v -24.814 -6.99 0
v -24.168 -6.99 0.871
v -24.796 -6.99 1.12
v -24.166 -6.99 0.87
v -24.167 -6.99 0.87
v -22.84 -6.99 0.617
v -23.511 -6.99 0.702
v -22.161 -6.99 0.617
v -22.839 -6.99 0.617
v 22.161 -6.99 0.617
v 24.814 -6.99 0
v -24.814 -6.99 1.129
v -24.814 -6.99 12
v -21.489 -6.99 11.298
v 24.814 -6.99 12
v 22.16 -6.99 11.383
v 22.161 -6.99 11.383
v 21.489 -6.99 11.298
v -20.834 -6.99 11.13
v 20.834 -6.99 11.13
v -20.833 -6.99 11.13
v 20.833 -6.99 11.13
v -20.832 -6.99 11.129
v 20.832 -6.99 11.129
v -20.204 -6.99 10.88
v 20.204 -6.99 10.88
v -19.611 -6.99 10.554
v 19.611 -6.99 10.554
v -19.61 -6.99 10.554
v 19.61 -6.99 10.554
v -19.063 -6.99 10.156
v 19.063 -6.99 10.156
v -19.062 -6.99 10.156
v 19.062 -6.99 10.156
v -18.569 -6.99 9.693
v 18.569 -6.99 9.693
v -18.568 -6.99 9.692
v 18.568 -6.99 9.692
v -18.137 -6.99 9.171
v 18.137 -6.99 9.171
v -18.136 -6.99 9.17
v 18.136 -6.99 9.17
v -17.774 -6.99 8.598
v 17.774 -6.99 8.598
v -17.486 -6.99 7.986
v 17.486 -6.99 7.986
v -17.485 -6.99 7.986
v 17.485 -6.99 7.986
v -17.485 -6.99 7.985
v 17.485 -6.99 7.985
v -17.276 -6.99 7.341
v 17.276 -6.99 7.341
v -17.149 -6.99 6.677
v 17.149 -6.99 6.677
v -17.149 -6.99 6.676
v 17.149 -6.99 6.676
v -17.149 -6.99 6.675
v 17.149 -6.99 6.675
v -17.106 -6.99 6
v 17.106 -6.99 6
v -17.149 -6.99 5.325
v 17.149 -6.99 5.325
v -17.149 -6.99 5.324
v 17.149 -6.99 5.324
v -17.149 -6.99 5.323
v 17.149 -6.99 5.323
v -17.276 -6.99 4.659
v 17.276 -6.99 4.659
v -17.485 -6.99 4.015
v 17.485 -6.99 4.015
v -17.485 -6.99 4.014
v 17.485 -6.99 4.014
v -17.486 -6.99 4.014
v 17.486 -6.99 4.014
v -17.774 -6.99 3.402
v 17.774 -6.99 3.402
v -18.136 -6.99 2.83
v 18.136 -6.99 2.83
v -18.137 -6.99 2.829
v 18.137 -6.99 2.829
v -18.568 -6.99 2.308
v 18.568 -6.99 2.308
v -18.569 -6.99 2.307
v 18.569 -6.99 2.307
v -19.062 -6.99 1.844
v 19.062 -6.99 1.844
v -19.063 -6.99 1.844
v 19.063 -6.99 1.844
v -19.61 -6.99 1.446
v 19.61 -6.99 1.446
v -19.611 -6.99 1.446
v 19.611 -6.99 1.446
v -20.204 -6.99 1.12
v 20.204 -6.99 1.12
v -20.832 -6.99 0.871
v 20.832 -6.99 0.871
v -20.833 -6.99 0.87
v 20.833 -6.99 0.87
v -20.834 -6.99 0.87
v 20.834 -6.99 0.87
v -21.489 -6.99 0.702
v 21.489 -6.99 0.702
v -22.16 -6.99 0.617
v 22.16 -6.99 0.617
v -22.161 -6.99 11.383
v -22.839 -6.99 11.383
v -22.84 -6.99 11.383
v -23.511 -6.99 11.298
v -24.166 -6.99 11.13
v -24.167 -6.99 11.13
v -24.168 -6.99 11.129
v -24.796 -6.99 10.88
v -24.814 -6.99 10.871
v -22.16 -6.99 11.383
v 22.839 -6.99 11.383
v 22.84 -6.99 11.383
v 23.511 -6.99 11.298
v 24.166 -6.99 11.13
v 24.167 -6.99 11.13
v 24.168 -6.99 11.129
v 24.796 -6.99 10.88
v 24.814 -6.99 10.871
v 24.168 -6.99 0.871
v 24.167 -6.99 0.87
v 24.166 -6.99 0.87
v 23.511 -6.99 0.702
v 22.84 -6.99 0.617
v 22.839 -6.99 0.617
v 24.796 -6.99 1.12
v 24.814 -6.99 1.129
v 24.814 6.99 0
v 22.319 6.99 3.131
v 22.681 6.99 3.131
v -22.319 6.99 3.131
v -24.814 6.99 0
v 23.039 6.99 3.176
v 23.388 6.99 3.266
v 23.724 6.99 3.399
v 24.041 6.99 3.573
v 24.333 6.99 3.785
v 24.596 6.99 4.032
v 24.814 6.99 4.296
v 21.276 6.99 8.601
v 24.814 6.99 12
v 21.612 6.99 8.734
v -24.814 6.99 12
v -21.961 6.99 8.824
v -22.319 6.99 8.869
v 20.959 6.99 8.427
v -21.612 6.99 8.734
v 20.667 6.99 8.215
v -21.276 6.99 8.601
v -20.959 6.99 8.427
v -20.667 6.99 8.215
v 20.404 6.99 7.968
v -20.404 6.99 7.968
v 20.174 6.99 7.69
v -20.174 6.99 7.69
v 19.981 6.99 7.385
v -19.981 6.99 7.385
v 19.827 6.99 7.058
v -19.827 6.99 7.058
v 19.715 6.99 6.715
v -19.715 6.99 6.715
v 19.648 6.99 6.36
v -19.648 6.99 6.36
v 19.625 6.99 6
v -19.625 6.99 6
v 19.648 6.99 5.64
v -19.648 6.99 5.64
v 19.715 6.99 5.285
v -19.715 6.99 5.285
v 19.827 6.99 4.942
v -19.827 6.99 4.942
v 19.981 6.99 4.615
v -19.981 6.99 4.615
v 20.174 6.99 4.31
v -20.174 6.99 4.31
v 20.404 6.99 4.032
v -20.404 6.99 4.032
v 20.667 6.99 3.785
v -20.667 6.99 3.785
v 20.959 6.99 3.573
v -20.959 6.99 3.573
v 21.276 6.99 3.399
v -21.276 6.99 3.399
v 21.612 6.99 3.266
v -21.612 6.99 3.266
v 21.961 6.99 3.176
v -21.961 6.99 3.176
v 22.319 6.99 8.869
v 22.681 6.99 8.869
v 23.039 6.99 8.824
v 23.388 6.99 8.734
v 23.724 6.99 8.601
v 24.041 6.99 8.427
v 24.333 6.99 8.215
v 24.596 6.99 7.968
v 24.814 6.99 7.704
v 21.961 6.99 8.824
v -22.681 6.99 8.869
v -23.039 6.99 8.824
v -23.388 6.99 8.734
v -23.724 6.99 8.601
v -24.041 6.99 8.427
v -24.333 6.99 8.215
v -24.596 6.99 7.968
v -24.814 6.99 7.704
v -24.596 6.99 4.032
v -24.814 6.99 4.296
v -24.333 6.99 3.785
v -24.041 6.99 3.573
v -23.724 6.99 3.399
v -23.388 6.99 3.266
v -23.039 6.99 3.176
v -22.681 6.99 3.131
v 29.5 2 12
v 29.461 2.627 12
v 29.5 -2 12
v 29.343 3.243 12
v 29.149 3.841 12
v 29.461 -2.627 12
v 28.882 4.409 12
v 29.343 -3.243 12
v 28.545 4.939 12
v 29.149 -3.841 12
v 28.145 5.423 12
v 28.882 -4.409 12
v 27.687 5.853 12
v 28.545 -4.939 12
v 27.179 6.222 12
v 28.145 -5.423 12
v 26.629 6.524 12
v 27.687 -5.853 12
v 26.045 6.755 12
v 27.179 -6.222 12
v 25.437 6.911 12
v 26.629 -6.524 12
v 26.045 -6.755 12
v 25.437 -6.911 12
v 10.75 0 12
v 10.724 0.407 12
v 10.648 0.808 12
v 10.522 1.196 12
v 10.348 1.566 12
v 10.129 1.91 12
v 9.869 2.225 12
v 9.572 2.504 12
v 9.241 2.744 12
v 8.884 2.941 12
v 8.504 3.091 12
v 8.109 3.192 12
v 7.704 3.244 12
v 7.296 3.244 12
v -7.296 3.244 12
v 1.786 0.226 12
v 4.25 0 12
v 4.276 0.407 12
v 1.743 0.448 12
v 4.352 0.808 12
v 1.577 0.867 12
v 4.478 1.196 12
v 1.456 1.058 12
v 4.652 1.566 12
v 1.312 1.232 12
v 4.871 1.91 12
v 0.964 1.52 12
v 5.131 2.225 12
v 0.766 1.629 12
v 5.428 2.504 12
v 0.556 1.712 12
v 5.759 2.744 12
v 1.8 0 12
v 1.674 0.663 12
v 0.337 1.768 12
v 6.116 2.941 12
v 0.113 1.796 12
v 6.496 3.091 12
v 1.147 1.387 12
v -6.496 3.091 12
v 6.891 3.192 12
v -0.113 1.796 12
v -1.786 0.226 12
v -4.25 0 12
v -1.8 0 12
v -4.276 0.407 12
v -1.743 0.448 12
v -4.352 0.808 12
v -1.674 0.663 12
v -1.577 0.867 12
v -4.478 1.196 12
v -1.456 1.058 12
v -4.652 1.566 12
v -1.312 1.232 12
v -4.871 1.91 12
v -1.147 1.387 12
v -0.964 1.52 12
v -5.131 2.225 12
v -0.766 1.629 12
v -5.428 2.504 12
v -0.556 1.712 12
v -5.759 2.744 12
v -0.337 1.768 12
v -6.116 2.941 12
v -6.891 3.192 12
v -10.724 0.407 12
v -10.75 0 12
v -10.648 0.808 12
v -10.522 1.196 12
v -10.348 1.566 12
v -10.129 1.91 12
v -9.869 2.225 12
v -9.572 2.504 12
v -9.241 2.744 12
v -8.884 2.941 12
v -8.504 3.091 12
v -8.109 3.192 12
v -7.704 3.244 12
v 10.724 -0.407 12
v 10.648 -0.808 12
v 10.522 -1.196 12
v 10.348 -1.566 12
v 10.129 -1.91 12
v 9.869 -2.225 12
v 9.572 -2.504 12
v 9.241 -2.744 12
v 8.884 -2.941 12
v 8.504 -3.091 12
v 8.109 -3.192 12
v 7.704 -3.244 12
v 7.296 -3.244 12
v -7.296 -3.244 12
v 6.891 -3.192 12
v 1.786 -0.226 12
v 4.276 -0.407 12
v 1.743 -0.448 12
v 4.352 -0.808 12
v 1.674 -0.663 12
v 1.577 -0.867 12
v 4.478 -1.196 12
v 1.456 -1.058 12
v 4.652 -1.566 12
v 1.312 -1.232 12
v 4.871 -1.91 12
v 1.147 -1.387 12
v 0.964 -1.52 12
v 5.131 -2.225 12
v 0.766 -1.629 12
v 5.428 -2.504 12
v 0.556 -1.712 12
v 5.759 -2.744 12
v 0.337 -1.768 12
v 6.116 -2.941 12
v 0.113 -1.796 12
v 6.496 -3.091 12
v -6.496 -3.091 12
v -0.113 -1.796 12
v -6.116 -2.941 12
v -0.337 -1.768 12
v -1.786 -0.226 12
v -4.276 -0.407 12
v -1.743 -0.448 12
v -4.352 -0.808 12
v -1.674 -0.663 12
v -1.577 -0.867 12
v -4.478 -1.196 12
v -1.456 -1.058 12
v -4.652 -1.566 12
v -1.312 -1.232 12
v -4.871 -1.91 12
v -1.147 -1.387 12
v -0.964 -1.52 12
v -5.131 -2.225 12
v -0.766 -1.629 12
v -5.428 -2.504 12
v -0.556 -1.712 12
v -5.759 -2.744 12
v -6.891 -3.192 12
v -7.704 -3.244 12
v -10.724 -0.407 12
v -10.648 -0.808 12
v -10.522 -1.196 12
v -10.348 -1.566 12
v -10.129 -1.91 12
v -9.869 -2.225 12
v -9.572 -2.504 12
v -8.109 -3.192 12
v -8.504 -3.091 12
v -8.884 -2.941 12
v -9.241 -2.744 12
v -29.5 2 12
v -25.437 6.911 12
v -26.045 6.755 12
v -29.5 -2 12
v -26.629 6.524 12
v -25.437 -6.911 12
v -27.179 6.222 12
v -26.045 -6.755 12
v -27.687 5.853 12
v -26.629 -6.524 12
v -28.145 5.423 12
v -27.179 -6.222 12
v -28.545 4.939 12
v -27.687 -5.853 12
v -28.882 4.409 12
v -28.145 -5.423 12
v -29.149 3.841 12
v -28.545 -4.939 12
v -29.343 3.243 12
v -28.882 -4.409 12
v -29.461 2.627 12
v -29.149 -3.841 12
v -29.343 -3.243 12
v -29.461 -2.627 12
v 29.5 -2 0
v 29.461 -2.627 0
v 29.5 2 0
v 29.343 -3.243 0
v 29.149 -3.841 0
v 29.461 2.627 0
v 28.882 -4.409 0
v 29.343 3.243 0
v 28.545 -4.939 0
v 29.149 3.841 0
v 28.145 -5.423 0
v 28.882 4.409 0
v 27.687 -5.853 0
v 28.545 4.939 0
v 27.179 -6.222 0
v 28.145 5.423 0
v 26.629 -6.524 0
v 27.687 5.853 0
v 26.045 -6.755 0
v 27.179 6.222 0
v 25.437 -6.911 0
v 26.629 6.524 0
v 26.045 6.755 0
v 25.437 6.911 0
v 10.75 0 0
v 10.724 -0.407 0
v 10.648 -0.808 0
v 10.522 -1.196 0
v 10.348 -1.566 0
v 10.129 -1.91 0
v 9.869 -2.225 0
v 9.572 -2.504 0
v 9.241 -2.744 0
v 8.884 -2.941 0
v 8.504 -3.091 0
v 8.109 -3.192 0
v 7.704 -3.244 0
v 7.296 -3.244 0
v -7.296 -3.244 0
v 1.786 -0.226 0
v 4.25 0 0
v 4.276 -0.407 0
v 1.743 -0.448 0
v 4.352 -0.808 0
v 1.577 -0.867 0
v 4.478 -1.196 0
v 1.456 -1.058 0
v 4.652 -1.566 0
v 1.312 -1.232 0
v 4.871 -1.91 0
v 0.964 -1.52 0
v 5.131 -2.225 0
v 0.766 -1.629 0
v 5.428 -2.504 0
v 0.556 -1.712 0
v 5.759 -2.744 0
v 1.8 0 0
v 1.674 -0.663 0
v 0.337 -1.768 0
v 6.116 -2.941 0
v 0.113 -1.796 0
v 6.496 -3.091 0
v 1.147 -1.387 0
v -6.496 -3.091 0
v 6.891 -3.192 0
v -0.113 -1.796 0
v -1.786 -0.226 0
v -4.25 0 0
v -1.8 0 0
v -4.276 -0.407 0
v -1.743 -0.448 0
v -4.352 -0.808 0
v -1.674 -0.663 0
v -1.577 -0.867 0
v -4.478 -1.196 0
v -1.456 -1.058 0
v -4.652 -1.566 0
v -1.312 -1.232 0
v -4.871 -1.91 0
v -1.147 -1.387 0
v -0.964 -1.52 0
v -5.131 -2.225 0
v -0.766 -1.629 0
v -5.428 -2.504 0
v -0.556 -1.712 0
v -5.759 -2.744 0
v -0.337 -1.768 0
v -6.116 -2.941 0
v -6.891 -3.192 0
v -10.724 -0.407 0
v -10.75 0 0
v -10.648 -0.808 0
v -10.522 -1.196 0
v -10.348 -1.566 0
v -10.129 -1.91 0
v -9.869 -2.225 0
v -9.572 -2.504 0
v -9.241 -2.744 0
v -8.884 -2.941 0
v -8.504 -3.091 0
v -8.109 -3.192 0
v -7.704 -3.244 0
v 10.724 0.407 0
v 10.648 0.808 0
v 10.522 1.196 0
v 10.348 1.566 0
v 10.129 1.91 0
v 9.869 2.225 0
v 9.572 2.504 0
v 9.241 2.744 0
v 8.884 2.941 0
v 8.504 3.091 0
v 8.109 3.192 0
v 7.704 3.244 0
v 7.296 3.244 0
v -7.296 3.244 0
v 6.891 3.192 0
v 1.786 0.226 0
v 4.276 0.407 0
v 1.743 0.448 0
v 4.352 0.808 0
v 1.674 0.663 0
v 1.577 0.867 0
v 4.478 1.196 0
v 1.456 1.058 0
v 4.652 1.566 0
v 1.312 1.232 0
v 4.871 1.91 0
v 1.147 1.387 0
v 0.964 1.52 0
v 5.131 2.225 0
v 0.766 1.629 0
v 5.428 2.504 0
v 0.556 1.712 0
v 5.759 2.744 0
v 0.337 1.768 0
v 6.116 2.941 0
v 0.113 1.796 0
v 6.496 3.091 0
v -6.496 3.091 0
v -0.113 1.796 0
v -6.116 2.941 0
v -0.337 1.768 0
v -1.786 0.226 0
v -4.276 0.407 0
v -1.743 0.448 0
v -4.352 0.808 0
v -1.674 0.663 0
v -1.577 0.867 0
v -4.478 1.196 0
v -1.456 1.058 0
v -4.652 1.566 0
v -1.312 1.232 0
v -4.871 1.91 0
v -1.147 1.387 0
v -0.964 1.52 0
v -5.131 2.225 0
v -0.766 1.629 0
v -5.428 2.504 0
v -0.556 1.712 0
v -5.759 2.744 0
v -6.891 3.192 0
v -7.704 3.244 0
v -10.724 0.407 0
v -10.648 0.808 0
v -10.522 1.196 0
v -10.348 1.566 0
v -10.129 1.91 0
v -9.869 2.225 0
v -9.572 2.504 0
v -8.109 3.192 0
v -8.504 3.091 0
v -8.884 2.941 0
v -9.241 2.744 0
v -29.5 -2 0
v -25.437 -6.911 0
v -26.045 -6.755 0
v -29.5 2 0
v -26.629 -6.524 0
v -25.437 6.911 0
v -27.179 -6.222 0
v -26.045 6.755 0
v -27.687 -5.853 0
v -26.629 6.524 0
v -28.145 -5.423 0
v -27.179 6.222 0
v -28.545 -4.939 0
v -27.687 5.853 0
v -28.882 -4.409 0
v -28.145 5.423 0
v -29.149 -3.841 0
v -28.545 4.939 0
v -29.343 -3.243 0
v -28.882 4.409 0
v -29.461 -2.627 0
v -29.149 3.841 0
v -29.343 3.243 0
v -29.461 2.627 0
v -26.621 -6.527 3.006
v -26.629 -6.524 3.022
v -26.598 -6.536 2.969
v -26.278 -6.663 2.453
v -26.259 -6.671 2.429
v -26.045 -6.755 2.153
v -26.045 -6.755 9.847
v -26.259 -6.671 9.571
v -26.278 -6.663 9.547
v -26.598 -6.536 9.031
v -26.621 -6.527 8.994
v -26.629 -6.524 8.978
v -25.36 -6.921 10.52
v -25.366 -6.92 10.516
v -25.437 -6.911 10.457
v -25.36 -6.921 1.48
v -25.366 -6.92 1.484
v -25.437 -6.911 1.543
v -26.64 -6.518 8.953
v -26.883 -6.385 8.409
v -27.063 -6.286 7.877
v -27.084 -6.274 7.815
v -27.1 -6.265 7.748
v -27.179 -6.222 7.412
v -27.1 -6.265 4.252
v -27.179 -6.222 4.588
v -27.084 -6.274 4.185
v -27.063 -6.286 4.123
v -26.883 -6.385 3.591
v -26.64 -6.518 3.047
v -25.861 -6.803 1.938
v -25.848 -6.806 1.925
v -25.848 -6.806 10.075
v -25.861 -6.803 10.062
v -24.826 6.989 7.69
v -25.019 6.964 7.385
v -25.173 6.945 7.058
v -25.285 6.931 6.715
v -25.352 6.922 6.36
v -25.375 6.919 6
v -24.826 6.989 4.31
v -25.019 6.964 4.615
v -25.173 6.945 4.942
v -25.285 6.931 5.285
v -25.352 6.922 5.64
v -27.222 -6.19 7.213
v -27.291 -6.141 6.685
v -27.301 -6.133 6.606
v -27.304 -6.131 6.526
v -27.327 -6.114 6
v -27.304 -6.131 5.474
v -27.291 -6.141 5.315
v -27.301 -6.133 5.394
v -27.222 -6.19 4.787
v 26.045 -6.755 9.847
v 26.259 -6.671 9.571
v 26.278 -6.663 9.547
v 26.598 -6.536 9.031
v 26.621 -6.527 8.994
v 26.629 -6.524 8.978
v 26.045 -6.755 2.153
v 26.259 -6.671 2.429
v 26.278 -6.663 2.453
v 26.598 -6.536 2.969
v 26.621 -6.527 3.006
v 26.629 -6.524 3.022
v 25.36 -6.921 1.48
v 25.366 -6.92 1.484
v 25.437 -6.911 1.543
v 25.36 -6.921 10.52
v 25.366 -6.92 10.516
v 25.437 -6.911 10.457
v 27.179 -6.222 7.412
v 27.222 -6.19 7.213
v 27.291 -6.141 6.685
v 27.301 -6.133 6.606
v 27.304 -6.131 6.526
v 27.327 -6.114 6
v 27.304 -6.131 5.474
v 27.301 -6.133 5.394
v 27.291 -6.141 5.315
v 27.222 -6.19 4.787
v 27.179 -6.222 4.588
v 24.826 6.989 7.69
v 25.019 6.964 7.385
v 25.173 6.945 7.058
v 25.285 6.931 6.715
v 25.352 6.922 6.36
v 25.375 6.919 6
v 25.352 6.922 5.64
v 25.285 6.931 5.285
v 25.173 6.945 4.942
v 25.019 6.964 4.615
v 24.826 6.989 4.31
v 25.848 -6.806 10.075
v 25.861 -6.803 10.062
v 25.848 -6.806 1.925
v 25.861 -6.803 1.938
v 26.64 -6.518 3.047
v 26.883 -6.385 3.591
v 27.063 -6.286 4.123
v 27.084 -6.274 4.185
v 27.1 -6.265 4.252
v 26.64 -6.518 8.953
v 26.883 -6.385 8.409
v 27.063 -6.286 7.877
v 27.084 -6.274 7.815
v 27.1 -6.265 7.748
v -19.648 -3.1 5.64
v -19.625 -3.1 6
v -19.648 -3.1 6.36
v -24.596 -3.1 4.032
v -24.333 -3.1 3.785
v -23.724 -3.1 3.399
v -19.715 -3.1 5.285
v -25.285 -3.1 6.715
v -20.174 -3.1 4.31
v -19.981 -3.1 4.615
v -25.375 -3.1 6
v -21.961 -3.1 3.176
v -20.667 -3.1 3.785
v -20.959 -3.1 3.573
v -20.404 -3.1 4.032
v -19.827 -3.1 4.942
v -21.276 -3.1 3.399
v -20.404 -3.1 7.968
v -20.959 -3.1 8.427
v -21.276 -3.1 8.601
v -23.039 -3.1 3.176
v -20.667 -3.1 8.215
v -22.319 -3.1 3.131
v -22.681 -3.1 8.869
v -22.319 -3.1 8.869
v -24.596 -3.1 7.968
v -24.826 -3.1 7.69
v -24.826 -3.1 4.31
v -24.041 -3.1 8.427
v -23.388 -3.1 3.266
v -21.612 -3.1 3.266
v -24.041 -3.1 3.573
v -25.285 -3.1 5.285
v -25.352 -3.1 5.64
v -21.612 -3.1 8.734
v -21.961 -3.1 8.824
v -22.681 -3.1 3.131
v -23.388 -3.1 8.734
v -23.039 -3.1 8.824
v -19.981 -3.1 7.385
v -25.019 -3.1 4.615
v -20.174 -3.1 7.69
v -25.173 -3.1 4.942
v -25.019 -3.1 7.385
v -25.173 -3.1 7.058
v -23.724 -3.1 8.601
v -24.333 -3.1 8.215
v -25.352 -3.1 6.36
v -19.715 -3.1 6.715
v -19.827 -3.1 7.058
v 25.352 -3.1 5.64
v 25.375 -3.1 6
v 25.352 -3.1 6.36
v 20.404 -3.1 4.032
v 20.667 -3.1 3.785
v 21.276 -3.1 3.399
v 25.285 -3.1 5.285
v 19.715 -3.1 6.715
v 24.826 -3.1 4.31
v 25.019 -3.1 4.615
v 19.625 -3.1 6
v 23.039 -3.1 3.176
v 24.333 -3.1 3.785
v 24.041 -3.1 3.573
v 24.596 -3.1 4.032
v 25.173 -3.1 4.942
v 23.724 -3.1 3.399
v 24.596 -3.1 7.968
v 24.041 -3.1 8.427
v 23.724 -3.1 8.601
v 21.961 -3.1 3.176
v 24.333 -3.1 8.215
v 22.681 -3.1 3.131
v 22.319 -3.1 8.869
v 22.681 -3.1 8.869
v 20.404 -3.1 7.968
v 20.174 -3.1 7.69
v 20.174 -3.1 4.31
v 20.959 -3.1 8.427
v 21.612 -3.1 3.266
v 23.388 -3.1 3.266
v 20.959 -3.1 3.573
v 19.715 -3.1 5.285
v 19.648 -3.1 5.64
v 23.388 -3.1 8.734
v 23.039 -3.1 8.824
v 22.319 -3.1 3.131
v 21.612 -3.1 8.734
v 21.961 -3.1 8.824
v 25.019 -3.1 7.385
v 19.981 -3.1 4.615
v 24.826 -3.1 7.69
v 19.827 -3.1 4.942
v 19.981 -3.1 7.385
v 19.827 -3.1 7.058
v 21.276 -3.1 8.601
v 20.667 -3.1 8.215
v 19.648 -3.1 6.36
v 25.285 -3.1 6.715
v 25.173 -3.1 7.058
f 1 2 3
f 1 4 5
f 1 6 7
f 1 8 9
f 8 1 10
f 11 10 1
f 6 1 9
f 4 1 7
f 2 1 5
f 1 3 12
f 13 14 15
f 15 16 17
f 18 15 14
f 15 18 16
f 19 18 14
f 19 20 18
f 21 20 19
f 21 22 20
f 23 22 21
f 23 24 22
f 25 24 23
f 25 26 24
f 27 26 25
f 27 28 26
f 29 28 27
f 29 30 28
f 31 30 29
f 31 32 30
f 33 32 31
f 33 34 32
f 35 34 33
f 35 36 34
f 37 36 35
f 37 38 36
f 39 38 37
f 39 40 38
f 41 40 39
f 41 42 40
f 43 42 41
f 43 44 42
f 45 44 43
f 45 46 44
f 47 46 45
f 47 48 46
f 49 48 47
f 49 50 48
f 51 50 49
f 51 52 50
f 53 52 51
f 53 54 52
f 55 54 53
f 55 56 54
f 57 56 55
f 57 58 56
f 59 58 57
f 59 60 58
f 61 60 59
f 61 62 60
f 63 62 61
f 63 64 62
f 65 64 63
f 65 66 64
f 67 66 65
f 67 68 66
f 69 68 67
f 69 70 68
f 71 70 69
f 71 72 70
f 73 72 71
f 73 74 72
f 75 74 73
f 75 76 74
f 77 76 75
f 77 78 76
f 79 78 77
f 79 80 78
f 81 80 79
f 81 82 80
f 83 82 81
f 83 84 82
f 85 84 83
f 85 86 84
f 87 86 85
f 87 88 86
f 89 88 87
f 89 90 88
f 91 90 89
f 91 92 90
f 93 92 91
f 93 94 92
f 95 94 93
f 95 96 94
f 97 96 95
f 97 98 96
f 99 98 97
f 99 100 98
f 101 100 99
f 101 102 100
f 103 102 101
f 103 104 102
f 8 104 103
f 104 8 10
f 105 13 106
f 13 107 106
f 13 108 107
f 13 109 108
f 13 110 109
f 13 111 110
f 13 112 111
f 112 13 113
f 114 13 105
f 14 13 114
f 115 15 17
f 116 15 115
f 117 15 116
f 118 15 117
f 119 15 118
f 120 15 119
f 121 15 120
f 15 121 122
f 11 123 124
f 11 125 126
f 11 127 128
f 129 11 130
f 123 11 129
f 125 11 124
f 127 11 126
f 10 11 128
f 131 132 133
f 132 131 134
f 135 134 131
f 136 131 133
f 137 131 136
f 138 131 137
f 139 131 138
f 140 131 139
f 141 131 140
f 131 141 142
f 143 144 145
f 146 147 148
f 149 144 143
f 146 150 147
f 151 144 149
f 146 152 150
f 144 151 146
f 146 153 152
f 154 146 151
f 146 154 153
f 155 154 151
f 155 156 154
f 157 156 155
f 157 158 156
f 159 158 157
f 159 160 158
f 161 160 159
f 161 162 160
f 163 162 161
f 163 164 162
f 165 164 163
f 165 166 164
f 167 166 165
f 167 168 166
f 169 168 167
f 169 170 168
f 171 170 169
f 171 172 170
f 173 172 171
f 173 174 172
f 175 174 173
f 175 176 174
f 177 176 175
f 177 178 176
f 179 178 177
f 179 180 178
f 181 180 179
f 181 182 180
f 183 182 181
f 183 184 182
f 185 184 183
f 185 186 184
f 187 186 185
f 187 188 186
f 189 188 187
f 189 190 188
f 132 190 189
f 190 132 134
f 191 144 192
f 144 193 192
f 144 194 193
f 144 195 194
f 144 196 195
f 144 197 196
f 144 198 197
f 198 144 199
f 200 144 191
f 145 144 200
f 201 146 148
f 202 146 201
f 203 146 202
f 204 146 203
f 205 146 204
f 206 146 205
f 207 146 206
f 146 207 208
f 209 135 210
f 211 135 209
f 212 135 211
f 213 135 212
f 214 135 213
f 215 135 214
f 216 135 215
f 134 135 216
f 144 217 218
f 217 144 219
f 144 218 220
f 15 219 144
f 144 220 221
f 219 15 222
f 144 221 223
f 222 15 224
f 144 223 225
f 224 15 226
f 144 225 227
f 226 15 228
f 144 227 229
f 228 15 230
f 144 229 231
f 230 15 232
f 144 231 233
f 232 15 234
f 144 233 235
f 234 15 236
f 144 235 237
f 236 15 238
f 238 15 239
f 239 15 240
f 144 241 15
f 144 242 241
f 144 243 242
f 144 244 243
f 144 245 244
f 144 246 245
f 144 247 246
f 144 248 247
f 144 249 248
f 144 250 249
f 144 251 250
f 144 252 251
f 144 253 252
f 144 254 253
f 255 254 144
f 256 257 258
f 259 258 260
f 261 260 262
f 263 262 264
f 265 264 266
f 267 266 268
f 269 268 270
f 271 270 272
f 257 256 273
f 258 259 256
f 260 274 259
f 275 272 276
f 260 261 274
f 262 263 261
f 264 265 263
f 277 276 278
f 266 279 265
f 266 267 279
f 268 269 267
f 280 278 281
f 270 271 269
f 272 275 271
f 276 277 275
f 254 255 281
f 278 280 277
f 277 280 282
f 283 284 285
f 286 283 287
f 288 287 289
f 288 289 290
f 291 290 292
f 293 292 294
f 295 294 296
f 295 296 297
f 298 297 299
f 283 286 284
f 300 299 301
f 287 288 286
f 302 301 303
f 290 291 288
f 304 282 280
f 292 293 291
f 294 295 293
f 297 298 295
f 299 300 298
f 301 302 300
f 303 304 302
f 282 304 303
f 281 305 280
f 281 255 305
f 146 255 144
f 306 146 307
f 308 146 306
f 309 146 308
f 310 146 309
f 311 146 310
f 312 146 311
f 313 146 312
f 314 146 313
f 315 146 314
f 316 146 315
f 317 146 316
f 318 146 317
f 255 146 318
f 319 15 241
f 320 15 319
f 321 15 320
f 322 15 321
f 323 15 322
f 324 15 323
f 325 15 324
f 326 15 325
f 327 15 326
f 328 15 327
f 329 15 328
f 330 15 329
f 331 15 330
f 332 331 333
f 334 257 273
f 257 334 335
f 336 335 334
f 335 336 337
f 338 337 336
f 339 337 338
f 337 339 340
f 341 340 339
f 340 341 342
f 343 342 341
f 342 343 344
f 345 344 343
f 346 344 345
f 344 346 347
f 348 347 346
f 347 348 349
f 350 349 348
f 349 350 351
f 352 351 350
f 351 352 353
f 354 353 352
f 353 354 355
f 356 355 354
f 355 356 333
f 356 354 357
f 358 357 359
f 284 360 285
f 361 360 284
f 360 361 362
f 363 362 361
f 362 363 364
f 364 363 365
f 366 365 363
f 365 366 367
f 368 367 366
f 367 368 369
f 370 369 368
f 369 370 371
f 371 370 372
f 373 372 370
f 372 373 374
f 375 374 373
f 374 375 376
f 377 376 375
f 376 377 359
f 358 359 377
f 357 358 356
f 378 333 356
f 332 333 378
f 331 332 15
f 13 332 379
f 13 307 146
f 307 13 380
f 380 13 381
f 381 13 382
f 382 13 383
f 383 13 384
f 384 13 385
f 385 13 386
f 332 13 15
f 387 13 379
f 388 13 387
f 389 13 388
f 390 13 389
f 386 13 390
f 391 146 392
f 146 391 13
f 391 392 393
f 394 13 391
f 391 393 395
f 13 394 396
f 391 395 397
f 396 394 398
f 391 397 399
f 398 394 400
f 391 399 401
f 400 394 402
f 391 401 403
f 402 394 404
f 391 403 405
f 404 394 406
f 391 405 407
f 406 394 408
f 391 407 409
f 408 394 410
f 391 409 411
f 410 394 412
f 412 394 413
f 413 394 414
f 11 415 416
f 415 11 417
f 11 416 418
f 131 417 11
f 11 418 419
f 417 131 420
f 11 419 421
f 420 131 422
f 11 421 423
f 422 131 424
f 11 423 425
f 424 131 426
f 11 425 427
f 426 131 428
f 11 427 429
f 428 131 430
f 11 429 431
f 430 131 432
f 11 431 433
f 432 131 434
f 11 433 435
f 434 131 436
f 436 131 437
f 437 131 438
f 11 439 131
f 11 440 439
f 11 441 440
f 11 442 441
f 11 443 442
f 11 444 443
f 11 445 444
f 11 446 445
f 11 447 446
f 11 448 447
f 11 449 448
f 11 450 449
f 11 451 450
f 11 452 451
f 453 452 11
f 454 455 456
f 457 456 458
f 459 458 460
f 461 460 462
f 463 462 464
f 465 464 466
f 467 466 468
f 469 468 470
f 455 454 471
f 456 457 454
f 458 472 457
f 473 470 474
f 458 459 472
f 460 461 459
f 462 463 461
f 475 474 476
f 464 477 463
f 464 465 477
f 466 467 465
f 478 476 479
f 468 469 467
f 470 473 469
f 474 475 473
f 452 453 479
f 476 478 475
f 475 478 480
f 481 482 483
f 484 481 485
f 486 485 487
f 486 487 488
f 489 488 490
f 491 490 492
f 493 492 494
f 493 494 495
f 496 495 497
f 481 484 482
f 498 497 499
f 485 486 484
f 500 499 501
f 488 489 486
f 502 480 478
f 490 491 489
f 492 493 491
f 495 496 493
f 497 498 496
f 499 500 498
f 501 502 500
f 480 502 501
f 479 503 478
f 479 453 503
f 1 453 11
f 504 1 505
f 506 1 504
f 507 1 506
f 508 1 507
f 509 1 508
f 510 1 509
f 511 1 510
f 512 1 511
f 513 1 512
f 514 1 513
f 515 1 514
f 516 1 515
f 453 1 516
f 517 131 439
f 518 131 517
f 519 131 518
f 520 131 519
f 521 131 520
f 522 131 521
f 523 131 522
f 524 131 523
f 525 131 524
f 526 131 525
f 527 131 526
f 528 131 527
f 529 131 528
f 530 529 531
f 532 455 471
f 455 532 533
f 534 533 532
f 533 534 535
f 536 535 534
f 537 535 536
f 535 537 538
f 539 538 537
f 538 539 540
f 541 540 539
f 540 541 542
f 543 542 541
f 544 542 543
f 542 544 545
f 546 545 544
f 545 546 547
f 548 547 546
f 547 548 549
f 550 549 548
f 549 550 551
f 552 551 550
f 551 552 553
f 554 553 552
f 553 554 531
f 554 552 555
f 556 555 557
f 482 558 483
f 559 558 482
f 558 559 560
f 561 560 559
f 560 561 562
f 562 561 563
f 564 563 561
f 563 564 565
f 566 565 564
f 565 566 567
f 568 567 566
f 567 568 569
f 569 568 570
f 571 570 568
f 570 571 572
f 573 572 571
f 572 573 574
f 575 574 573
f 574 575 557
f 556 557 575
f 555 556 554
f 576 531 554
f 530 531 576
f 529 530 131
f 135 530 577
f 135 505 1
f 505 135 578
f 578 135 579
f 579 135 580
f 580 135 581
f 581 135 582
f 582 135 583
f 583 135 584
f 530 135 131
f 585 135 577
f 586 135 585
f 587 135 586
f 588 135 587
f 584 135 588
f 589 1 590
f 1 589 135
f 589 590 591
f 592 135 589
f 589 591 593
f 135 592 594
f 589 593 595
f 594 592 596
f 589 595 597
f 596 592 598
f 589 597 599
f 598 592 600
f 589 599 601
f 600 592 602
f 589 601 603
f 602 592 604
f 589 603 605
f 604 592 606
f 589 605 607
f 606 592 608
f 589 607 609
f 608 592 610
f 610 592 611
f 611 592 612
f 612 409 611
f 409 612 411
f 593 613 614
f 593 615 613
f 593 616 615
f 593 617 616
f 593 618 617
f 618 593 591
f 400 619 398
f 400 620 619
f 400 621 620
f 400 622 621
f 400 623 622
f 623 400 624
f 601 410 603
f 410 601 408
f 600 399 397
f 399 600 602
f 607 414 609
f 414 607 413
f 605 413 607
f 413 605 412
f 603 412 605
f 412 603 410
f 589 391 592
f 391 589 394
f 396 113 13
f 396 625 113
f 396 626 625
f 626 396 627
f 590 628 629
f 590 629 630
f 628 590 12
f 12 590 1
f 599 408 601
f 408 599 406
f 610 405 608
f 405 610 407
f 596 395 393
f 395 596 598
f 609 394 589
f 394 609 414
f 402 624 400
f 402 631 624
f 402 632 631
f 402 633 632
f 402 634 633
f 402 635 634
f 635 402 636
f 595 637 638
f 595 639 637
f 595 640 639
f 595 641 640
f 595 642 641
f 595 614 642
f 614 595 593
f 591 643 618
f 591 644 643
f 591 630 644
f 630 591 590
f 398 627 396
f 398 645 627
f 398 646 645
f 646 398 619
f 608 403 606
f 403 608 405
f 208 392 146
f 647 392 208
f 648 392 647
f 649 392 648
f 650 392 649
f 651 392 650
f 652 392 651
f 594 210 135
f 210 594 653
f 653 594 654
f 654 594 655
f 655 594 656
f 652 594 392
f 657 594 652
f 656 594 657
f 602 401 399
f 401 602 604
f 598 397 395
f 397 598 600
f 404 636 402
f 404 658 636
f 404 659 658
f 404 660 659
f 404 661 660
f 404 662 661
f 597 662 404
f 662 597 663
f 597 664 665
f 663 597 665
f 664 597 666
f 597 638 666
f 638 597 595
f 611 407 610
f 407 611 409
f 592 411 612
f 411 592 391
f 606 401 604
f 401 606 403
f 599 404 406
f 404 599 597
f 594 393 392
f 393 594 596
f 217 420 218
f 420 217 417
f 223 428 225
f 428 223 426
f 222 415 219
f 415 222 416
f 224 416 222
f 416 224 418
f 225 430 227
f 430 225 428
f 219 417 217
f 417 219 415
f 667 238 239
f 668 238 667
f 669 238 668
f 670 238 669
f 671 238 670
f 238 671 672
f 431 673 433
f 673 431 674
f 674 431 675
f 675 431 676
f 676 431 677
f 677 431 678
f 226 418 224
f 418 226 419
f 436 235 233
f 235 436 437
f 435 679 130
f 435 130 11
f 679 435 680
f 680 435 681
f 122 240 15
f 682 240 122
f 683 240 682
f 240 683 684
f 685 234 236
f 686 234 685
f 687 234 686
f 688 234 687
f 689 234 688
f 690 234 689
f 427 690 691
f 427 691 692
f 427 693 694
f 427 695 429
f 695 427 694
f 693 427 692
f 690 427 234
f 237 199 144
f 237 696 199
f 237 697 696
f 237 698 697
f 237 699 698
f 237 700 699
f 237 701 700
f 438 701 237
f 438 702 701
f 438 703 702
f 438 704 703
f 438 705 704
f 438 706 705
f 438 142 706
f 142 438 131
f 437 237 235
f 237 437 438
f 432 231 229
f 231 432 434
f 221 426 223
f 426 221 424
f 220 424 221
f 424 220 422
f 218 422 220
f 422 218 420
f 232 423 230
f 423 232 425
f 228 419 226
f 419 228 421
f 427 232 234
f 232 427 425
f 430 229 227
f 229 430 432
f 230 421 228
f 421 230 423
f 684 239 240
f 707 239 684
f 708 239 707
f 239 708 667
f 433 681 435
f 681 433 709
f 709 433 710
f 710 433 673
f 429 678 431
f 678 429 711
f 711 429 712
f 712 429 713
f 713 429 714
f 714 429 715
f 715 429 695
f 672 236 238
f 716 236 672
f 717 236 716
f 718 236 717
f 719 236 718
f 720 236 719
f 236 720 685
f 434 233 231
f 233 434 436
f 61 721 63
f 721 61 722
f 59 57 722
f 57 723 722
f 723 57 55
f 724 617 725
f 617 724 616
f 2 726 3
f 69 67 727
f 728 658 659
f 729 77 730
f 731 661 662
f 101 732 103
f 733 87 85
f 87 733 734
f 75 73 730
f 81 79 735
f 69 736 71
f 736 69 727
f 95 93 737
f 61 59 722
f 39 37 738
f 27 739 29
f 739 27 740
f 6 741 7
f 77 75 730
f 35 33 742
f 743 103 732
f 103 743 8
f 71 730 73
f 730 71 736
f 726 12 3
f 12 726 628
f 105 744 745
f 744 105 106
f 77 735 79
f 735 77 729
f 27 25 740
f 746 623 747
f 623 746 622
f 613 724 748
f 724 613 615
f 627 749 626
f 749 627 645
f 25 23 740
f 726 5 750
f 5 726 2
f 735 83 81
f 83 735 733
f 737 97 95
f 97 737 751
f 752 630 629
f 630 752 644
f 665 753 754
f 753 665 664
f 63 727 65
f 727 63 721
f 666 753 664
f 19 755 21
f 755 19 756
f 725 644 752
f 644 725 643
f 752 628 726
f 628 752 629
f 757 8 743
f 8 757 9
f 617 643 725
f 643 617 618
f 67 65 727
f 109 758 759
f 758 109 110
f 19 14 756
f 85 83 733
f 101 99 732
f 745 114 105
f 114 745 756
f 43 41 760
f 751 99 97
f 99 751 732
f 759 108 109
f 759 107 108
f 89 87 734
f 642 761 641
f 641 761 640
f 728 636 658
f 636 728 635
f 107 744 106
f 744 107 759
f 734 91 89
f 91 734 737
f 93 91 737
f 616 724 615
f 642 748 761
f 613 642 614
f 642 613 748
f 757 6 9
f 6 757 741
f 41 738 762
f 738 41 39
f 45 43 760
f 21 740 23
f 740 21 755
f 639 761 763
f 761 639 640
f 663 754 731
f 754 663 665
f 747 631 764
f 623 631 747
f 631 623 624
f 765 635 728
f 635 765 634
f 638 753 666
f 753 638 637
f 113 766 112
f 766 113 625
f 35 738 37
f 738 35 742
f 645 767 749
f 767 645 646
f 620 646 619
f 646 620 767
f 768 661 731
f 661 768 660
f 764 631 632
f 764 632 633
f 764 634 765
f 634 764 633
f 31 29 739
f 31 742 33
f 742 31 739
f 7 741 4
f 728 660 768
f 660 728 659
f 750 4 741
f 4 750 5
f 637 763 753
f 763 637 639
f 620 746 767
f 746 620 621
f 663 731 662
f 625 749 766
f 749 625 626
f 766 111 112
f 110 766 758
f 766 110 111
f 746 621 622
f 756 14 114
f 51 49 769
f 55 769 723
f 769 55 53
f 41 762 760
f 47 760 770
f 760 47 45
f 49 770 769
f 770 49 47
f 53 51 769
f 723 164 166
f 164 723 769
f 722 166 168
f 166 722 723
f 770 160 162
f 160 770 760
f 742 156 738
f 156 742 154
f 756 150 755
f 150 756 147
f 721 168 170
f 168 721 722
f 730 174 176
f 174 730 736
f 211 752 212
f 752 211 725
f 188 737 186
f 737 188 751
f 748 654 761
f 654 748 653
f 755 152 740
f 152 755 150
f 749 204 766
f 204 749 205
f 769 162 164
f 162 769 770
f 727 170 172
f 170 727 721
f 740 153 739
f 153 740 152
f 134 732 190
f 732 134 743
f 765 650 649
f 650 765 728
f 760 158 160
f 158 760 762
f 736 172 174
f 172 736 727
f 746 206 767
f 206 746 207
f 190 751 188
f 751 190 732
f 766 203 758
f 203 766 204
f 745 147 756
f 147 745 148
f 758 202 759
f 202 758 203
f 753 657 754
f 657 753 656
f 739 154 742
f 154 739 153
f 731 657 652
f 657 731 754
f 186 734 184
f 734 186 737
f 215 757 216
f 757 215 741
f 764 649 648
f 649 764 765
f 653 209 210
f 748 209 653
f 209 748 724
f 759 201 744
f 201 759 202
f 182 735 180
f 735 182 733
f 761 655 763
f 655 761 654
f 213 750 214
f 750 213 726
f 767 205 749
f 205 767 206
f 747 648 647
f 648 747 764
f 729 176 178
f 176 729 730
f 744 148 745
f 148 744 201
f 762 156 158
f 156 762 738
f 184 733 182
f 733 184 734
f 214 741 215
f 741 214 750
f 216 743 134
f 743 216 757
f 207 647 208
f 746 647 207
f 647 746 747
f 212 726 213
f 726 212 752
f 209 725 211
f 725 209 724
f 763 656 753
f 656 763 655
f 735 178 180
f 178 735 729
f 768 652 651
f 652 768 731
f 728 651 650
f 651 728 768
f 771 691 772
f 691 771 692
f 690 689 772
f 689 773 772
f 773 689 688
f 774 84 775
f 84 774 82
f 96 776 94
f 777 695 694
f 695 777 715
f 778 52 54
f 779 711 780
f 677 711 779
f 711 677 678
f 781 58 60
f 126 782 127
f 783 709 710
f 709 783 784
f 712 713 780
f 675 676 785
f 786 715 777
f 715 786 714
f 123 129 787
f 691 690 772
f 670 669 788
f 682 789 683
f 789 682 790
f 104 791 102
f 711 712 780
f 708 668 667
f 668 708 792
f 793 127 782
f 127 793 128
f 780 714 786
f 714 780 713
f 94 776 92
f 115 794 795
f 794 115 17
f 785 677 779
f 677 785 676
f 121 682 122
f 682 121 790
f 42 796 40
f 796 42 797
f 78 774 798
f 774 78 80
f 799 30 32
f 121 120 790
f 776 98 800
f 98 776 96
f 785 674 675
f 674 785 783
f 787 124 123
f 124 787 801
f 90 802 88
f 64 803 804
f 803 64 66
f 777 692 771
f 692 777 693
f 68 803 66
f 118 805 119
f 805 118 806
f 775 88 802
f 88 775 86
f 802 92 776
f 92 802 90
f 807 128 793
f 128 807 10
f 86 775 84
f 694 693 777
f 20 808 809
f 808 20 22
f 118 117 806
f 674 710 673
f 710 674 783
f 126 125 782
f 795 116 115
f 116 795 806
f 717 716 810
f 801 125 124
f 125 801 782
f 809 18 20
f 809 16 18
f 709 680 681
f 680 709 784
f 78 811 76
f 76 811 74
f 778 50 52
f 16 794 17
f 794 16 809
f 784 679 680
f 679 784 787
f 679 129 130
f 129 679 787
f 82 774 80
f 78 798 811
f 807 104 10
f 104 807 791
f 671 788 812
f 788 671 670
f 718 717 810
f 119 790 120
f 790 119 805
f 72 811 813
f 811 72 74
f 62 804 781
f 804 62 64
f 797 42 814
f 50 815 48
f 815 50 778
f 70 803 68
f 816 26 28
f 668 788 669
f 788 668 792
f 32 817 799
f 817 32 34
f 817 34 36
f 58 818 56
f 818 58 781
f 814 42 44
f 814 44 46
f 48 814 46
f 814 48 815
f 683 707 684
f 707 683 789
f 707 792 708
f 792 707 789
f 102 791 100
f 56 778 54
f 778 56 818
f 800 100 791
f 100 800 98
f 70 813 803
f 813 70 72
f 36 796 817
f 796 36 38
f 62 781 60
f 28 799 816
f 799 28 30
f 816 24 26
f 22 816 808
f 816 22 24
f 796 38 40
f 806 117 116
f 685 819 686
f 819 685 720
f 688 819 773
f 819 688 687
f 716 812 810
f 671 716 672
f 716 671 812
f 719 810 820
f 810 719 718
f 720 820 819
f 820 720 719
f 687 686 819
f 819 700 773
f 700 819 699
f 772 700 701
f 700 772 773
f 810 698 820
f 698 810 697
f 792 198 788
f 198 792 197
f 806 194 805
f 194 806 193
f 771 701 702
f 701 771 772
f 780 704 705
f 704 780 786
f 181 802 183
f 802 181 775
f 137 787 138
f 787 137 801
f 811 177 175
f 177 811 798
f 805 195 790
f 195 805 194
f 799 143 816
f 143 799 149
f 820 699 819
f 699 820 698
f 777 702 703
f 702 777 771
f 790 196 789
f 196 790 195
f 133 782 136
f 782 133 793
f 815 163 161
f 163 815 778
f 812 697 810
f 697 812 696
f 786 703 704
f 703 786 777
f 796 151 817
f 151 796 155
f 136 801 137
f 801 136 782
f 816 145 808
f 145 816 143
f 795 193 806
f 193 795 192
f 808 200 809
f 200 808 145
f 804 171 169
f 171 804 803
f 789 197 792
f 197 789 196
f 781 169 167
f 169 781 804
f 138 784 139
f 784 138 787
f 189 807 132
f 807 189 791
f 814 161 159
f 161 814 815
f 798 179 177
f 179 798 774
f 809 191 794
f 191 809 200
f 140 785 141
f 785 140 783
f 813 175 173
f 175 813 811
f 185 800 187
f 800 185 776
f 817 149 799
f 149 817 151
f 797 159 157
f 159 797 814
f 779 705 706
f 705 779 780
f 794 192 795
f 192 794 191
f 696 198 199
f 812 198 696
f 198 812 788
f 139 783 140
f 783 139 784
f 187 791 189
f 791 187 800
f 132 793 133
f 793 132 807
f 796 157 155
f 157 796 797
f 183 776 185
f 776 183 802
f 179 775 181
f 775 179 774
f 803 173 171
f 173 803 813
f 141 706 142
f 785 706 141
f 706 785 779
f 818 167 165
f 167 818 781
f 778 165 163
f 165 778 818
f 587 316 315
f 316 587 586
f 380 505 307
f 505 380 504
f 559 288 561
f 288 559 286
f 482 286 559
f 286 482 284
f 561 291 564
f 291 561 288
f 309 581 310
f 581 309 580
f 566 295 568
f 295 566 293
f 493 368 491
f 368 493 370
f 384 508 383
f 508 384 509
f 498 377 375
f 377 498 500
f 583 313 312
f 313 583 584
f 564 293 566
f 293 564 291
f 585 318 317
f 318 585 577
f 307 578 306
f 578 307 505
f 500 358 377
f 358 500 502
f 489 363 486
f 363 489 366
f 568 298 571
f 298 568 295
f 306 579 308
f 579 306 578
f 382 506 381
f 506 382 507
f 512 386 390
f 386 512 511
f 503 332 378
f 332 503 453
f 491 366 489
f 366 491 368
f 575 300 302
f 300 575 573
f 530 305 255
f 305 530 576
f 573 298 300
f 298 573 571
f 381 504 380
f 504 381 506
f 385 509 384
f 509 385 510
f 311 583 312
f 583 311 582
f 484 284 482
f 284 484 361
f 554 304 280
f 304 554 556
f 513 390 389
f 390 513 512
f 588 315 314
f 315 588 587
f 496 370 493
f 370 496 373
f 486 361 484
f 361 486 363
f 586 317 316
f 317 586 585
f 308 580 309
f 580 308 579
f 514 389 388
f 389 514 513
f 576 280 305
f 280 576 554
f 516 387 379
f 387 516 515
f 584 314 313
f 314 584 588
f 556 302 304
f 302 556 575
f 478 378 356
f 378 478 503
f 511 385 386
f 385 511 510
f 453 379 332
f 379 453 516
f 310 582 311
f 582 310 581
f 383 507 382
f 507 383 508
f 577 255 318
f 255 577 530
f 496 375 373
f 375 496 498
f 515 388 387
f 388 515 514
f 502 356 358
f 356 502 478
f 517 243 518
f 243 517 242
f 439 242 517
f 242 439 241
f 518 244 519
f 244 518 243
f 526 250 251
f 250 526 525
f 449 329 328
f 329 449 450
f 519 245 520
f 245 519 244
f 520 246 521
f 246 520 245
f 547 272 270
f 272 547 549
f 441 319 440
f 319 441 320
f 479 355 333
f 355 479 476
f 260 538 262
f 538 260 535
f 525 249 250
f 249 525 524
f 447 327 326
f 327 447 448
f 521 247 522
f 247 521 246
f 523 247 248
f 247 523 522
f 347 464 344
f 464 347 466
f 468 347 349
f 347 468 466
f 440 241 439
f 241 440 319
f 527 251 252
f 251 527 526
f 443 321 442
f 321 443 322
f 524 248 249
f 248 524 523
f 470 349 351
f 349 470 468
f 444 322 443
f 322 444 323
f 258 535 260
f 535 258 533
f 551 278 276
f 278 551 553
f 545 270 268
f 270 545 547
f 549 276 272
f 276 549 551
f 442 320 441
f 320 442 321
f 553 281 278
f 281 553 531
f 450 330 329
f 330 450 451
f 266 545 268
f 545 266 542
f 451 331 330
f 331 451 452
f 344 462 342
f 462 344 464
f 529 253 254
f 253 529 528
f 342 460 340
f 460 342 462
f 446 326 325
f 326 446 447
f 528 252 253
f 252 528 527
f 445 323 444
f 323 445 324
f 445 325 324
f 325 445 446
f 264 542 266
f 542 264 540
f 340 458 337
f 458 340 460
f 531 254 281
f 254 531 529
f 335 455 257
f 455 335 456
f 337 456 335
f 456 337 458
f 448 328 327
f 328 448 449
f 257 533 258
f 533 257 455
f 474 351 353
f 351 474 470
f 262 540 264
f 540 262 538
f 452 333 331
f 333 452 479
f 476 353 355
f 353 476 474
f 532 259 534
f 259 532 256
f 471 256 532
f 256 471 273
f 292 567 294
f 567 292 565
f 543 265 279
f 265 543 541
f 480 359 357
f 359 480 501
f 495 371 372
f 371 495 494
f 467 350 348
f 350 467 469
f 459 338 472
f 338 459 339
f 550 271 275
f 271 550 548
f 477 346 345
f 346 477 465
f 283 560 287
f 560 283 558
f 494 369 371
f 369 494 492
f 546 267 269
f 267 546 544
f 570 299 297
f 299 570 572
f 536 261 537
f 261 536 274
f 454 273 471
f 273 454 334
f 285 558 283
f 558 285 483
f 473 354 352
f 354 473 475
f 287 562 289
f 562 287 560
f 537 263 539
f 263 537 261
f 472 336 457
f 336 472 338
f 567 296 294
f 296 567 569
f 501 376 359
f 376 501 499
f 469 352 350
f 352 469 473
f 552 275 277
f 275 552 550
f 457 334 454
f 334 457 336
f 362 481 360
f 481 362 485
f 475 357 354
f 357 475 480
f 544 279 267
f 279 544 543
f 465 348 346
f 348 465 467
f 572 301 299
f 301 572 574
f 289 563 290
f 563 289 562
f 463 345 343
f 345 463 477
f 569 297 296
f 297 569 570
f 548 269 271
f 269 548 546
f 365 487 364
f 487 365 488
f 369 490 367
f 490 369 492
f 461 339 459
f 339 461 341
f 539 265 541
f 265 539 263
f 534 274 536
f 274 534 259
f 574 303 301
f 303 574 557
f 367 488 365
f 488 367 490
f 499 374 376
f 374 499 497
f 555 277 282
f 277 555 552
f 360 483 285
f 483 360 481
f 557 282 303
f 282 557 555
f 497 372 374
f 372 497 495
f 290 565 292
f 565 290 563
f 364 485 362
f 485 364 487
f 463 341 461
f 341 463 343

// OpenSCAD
$fn = 50;


difference() {
	union() {
		hull() {
			translate(v = [-9.5000000000, 2.0000000000, 0]) {
				cylinder(h = 12, r = 5);
			}
			translate(v = [9.5000000000, 2.0000000000, 0]) {
				cylinder(h = 12, r = 5);
			}
			translate(v = [-9.5000000000, -2.0000000000, 0]) {
				cylinder(h = 12, r = 5);
			}
			translate(v = [9.5000000000, -2.0000000000, 0]) {
				cylinder(h = 12, r = 5);
			}
		}
		translate(v = [-15.0000000000, 0.0000000000, 0]) {
			hull() {
				translate(v = [-9.5000000000, 2.0000000000, 0]) {
					cylinder(h = 12, r = 5);
				}
				translate(v = [9.5000000000, 2.0000000000, 0]) {
					cylinder(h = 12, r = 5);
				}
				translate(v = [-9.5000000000, -2.0000000000, 0]) {
					cylinder(h = 12, r = 5);
				}
				translate(v = [9.5000000000, -2.0000000000, 0]) {
					cylinder(h = 12, r = 5);
				}
			}
		}
		translate(v = [-15.0000000000, 0.0000000000, 0]) {
			hull() {
				translate(v = [-9.5000000000, 2.0000000000, 0]) {
					cylinder(h = 12, r = 5);
				}
				translate(v = [9.5000000000, 2.0000000000, 0]) {
					cylinder(h = 12, r = 5);
				}
				translate(v = [-9.5000000000, -2.0000000000, 0]) {
					cylinder(h = 12, r = 5);
				}
				translate(v = [9.5000000000, -2.0000000000, 0]) {
					cylinder(h = 12, r = 5);
				}
			}
		}
		translate(v = [15.0000000000, 0.0000000000, 0]) {
			hull() {
				translate(v = [-9.5000000000, 2.0000000000, 0]) {
					cylinder(h = 12, r = 5);
				}
				translate(v = [9.5000000000, 2.0000000000, 0]) {
					cylinder(h = 12, r = 5);
				}
				translate(v = [-9.5000000000, -2.0000000000, 0]) {
					cylinder(h = 12, r = 5);
				}
				translate(v = [9.5000000000, -2.0000000000, 0]) {
					cylinder(h = 12, r = 5);
				}
			}
		}
		translate(v = [15.0000000000, 0.0000000000, 0]) {
			hull() {
				translate(v = [-9.5000000000, 2.0000000000, 0]) {
					cylinder(h = 12, r = 5);
				}
				translate(v = [9.5000000000, 2.0000000000, 0]) {
					cylinder(h = 12, r = 5);
				}
				translate(v = [-9.5000000000, -2.0000000000, 0]) {
					cylinder(h = 12, r = 5);
				}
				translate(v = [9.5000000000, -2.0000000000, 0]) {
					cylinder(h = 12, r = 5);
				}
			}
		}
	}
	union() {
		translate(v = [-22.5000000000, -7.0000000000, 6.0000000000]) {
			rotate(a = [90, 0, 0]) {
				difference() {
					union() {
						#translate(v = [0, 0, -14.0000000000]) {
							cylinder(h = 14, r = 2.6000000000);
						}
						#translate(v = [0, 0, -3.9000000000]) {
							cylinder(h = 3.9000000000, r1 = 2.8750000000, r2 = 5.4000000000);
						}
						#translate(v = [0, 0, -14.0000000000]) {
							cylinder(h = 14, r = 2.8750000000);
						}
						#translate(v = [0, 0, -14.0000000000]) {
							cylinder(h = 14, r = 2.6000000000);
						}
					}
					union();
				}
			}
		}
		translate(v = [22.5000000000, -7.0000000000, 6.0000000000]) {
			rotate(a = [90, 0, 0]) {
				difference() {
					union() {
						#translate(v = [0, 0, -14.0000000000]) {
							cylinder(h = 14, r = 2.6000000000);
						}
						#translate(v = [0, 0, -3.9000000000]) {
							cylinder(h = 3.9000000000, r1 = 2.8750000000, r2 = 5.4000000000);
						}
						#translate(v = [0, 0, -14.0000000000]) {
							cylinder(h = 14, r = 2.8750000000);
						}
						#translate(v = [0, 0, -14.0000000000]) {
							cylinder(h = 14, r = 2.6000000000);
						}
					}
					union();
				}
			}
		}
		translate(v = [-7.5000000000, 0.0000000000, 0]) {
			translate(v = [0, 0, -100]) {
				cylinder(h = 200, r = 3.2500000000);
			}
		}
		translate(v = [7.5000000000, 0.0000000000, 0]) {
			translate(v = [0, 0, -100]) {
				cylinder(h = 200, r = 3.2500000000);
			}
		}
		translate(v = [-7.5000000000, 0.0000000000, 0]) {
			translate(v = [0, 0, -100]) {
				cylinder(h = 200, r = 1.8000000000);
			}
		}
		translate(v = [0, 0, -100]) {
			cylinder(h = 200, r = 1.8000000000);
		}
		translate(v = [7.5000000000, 0.0000000000, 0]) {
			translate(v = [0, 0, -100]) {
				cylinder(h = 200, r = 1.8000000000);
			}
		}
	}
}
